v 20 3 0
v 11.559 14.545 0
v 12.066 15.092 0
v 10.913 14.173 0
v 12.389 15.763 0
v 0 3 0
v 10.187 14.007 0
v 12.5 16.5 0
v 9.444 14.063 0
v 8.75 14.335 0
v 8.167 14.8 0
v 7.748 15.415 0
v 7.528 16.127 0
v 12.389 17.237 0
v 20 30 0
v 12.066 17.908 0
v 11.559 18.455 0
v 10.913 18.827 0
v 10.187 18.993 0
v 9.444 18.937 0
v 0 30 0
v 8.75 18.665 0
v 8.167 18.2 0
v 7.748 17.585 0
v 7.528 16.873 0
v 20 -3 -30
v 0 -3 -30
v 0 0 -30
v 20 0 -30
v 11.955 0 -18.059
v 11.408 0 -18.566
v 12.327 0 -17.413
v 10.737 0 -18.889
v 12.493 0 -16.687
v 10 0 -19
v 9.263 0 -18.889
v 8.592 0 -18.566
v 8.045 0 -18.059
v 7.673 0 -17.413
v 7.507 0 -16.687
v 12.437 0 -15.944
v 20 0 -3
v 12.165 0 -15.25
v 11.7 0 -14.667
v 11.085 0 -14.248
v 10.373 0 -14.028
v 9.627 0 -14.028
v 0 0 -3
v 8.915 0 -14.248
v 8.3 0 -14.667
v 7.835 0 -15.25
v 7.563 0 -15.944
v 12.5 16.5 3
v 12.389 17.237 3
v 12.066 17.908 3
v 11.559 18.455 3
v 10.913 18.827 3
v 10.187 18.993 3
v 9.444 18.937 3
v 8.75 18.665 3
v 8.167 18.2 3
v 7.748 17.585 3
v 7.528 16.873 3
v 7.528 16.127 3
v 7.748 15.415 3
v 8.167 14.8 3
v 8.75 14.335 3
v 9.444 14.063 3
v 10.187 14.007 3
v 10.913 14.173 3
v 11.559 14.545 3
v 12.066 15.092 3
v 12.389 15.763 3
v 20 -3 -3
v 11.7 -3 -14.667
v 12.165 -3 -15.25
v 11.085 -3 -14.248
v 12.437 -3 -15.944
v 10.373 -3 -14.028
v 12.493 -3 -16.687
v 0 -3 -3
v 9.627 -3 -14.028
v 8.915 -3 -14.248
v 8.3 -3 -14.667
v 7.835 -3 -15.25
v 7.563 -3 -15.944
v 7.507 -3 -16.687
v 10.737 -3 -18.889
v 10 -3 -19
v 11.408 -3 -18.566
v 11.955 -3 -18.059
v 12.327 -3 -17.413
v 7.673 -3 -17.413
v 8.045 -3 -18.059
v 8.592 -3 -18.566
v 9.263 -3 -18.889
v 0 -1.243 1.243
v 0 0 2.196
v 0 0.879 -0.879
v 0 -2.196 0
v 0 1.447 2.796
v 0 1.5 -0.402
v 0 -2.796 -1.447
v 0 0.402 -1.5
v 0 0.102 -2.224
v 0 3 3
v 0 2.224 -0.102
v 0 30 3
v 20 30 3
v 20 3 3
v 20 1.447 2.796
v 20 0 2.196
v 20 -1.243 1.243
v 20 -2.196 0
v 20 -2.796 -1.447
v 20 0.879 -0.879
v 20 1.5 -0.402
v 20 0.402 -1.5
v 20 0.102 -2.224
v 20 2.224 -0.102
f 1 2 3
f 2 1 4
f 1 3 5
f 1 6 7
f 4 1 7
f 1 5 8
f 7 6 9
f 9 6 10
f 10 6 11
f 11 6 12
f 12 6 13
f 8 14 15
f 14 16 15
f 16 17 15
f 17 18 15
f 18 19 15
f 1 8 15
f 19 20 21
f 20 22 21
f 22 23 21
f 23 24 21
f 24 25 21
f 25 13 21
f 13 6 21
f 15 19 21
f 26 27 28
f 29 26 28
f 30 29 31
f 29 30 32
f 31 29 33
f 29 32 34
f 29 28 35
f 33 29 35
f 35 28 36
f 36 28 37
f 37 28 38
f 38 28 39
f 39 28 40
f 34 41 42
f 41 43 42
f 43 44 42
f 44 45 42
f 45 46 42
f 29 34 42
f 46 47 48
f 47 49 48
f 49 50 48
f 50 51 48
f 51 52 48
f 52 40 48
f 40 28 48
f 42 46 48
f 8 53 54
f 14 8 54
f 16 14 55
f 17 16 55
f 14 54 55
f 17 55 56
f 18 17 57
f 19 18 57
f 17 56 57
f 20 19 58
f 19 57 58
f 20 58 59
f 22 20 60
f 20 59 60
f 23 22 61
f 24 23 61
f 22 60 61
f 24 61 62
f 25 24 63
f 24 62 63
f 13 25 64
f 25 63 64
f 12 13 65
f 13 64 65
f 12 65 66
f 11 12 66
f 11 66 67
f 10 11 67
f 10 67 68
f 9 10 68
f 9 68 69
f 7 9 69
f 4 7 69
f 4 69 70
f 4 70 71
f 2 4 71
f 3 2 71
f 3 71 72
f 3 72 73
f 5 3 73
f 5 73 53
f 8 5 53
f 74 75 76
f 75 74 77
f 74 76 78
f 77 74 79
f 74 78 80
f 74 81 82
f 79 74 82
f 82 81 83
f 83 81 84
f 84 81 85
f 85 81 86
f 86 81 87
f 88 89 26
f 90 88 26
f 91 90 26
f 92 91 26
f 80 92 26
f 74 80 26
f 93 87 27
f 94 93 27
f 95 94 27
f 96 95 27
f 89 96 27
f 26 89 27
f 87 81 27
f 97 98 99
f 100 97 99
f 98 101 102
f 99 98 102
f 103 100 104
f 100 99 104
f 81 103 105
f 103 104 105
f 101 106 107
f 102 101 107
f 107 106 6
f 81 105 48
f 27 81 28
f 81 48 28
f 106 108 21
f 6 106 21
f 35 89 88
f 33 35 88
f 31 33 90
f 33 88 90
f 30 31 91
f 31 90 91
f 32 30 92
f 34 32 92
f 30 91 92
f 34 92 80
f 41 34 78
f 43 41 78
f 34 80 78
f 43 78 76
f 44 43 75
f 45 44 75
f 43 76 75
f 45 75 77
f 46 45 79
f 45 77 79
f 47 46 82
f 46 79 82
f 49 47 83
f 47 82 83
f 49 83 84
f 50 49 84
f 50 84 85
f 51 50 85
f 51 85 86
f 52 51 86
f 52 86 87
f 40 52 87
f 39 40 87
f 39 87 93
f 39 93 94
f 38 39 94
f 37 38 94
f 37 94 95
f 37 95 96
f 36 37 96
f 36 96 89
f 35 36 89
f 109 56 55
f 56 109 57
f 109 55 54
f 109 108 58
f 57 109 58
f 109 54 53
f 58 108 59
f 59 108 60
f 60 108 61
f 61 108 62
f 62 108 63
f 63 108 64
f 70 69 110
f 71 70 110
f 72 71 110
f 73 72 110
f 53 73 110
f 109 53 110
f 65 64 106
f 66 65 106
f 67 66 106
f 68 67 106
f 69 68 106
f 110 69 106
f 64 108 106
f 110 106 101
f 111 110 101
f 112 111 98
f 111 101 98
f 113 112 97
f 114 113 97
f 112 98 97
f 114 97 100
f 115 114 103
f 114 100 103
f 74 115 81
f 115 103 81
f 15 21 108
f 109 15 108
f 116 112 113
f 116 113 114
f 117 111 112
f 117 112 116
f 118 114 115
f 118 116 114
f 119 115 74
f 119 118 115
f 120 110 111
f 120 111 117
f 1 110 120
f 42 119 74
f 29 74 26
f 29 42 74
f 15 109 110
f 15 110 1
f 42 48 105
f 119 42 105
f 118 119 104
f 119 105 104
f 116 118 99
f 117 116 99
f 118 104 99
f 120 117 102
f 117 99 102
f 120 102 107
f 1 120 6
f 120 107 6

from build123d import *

# Parameters (mm, degrees)
BASE_FLANGE1_DEPTH = 20
CUT_EXTRUDE1_REACH = 50.877
SKETCH6_R          = 2.5
CUT_EXTRUDE2_REACH = 50.877
SKETCH7_R          = 2.5


# Sheet-metal steps are written as plain solids
with BuildPart() as part:
    # Sketch1 → Base-Flange1 (new body)
    with BuildSketch(Plane(origin=(0, 0, 0), x_dir=(0, 0, -1), z_dir=(1, 0, 0))):
        with BuildLine():
            Line((30, 0), (3, 0))
            ThreePointArc((3, 0), (0.878679656, 0.878679656), (0, 3))
            Line((0, 3), (0, 30))
            Line((0, 30), (-3, 30))
            Line((-3, 30), (-3, 3))
            ThreePointArc((-3, 3), (-1.242640687, -1.242640687), (3, -3))
            Line((3, -3), (30, -3))
            Line((30, -3), (30, 0))
        make_face()
    extrude(amount=BASE_FLANGE1_DEPTH)

    # Sketch6 → Cut-Extrude1 (cut, up to next)
    with BuildSketch(Plane.XZ.offset(3), mode=Mode.PRIVATE) as cut_extrude1_sk1:
        with Locations(Location((10, -16.5, 0), (0, 0, 270))):
            Circle(SKETCH6_R)
    cut_extrude1_tool1 = extrude(cut_extrude1_sk1.sketch, amount=-CUT_EXTRUDE1_REACH, mode=Mode.PRIVATE) & part.part
    add(cut_extrude1_tool1.solids().sort_by_distance((10, -3, -16.5))[0], mode=Mode.SUBTRACT)

    # Sketch7 → Cut-Extrude2 (cut, up to next)
    with BuildSketch(Plane.XY.offset(3), mode=Mode.PRIVATE) as cut_extrude2_sk1:
        with Locations((10, 16.5)):
            Circle(SKETCH7_R)
    cut_extrude2_tool1 = extrude(cut_extrude2_sk1.sketch, amount=-CUT_EXTRUDE2_REACH, mode=Mode.PRIVATE) & part.part
    add(cut_extrude2_tool1.solids().sort_by_distance((10, 16.5, 3))[0], mode=Mode.SUBTRACT)


solid = part.part
